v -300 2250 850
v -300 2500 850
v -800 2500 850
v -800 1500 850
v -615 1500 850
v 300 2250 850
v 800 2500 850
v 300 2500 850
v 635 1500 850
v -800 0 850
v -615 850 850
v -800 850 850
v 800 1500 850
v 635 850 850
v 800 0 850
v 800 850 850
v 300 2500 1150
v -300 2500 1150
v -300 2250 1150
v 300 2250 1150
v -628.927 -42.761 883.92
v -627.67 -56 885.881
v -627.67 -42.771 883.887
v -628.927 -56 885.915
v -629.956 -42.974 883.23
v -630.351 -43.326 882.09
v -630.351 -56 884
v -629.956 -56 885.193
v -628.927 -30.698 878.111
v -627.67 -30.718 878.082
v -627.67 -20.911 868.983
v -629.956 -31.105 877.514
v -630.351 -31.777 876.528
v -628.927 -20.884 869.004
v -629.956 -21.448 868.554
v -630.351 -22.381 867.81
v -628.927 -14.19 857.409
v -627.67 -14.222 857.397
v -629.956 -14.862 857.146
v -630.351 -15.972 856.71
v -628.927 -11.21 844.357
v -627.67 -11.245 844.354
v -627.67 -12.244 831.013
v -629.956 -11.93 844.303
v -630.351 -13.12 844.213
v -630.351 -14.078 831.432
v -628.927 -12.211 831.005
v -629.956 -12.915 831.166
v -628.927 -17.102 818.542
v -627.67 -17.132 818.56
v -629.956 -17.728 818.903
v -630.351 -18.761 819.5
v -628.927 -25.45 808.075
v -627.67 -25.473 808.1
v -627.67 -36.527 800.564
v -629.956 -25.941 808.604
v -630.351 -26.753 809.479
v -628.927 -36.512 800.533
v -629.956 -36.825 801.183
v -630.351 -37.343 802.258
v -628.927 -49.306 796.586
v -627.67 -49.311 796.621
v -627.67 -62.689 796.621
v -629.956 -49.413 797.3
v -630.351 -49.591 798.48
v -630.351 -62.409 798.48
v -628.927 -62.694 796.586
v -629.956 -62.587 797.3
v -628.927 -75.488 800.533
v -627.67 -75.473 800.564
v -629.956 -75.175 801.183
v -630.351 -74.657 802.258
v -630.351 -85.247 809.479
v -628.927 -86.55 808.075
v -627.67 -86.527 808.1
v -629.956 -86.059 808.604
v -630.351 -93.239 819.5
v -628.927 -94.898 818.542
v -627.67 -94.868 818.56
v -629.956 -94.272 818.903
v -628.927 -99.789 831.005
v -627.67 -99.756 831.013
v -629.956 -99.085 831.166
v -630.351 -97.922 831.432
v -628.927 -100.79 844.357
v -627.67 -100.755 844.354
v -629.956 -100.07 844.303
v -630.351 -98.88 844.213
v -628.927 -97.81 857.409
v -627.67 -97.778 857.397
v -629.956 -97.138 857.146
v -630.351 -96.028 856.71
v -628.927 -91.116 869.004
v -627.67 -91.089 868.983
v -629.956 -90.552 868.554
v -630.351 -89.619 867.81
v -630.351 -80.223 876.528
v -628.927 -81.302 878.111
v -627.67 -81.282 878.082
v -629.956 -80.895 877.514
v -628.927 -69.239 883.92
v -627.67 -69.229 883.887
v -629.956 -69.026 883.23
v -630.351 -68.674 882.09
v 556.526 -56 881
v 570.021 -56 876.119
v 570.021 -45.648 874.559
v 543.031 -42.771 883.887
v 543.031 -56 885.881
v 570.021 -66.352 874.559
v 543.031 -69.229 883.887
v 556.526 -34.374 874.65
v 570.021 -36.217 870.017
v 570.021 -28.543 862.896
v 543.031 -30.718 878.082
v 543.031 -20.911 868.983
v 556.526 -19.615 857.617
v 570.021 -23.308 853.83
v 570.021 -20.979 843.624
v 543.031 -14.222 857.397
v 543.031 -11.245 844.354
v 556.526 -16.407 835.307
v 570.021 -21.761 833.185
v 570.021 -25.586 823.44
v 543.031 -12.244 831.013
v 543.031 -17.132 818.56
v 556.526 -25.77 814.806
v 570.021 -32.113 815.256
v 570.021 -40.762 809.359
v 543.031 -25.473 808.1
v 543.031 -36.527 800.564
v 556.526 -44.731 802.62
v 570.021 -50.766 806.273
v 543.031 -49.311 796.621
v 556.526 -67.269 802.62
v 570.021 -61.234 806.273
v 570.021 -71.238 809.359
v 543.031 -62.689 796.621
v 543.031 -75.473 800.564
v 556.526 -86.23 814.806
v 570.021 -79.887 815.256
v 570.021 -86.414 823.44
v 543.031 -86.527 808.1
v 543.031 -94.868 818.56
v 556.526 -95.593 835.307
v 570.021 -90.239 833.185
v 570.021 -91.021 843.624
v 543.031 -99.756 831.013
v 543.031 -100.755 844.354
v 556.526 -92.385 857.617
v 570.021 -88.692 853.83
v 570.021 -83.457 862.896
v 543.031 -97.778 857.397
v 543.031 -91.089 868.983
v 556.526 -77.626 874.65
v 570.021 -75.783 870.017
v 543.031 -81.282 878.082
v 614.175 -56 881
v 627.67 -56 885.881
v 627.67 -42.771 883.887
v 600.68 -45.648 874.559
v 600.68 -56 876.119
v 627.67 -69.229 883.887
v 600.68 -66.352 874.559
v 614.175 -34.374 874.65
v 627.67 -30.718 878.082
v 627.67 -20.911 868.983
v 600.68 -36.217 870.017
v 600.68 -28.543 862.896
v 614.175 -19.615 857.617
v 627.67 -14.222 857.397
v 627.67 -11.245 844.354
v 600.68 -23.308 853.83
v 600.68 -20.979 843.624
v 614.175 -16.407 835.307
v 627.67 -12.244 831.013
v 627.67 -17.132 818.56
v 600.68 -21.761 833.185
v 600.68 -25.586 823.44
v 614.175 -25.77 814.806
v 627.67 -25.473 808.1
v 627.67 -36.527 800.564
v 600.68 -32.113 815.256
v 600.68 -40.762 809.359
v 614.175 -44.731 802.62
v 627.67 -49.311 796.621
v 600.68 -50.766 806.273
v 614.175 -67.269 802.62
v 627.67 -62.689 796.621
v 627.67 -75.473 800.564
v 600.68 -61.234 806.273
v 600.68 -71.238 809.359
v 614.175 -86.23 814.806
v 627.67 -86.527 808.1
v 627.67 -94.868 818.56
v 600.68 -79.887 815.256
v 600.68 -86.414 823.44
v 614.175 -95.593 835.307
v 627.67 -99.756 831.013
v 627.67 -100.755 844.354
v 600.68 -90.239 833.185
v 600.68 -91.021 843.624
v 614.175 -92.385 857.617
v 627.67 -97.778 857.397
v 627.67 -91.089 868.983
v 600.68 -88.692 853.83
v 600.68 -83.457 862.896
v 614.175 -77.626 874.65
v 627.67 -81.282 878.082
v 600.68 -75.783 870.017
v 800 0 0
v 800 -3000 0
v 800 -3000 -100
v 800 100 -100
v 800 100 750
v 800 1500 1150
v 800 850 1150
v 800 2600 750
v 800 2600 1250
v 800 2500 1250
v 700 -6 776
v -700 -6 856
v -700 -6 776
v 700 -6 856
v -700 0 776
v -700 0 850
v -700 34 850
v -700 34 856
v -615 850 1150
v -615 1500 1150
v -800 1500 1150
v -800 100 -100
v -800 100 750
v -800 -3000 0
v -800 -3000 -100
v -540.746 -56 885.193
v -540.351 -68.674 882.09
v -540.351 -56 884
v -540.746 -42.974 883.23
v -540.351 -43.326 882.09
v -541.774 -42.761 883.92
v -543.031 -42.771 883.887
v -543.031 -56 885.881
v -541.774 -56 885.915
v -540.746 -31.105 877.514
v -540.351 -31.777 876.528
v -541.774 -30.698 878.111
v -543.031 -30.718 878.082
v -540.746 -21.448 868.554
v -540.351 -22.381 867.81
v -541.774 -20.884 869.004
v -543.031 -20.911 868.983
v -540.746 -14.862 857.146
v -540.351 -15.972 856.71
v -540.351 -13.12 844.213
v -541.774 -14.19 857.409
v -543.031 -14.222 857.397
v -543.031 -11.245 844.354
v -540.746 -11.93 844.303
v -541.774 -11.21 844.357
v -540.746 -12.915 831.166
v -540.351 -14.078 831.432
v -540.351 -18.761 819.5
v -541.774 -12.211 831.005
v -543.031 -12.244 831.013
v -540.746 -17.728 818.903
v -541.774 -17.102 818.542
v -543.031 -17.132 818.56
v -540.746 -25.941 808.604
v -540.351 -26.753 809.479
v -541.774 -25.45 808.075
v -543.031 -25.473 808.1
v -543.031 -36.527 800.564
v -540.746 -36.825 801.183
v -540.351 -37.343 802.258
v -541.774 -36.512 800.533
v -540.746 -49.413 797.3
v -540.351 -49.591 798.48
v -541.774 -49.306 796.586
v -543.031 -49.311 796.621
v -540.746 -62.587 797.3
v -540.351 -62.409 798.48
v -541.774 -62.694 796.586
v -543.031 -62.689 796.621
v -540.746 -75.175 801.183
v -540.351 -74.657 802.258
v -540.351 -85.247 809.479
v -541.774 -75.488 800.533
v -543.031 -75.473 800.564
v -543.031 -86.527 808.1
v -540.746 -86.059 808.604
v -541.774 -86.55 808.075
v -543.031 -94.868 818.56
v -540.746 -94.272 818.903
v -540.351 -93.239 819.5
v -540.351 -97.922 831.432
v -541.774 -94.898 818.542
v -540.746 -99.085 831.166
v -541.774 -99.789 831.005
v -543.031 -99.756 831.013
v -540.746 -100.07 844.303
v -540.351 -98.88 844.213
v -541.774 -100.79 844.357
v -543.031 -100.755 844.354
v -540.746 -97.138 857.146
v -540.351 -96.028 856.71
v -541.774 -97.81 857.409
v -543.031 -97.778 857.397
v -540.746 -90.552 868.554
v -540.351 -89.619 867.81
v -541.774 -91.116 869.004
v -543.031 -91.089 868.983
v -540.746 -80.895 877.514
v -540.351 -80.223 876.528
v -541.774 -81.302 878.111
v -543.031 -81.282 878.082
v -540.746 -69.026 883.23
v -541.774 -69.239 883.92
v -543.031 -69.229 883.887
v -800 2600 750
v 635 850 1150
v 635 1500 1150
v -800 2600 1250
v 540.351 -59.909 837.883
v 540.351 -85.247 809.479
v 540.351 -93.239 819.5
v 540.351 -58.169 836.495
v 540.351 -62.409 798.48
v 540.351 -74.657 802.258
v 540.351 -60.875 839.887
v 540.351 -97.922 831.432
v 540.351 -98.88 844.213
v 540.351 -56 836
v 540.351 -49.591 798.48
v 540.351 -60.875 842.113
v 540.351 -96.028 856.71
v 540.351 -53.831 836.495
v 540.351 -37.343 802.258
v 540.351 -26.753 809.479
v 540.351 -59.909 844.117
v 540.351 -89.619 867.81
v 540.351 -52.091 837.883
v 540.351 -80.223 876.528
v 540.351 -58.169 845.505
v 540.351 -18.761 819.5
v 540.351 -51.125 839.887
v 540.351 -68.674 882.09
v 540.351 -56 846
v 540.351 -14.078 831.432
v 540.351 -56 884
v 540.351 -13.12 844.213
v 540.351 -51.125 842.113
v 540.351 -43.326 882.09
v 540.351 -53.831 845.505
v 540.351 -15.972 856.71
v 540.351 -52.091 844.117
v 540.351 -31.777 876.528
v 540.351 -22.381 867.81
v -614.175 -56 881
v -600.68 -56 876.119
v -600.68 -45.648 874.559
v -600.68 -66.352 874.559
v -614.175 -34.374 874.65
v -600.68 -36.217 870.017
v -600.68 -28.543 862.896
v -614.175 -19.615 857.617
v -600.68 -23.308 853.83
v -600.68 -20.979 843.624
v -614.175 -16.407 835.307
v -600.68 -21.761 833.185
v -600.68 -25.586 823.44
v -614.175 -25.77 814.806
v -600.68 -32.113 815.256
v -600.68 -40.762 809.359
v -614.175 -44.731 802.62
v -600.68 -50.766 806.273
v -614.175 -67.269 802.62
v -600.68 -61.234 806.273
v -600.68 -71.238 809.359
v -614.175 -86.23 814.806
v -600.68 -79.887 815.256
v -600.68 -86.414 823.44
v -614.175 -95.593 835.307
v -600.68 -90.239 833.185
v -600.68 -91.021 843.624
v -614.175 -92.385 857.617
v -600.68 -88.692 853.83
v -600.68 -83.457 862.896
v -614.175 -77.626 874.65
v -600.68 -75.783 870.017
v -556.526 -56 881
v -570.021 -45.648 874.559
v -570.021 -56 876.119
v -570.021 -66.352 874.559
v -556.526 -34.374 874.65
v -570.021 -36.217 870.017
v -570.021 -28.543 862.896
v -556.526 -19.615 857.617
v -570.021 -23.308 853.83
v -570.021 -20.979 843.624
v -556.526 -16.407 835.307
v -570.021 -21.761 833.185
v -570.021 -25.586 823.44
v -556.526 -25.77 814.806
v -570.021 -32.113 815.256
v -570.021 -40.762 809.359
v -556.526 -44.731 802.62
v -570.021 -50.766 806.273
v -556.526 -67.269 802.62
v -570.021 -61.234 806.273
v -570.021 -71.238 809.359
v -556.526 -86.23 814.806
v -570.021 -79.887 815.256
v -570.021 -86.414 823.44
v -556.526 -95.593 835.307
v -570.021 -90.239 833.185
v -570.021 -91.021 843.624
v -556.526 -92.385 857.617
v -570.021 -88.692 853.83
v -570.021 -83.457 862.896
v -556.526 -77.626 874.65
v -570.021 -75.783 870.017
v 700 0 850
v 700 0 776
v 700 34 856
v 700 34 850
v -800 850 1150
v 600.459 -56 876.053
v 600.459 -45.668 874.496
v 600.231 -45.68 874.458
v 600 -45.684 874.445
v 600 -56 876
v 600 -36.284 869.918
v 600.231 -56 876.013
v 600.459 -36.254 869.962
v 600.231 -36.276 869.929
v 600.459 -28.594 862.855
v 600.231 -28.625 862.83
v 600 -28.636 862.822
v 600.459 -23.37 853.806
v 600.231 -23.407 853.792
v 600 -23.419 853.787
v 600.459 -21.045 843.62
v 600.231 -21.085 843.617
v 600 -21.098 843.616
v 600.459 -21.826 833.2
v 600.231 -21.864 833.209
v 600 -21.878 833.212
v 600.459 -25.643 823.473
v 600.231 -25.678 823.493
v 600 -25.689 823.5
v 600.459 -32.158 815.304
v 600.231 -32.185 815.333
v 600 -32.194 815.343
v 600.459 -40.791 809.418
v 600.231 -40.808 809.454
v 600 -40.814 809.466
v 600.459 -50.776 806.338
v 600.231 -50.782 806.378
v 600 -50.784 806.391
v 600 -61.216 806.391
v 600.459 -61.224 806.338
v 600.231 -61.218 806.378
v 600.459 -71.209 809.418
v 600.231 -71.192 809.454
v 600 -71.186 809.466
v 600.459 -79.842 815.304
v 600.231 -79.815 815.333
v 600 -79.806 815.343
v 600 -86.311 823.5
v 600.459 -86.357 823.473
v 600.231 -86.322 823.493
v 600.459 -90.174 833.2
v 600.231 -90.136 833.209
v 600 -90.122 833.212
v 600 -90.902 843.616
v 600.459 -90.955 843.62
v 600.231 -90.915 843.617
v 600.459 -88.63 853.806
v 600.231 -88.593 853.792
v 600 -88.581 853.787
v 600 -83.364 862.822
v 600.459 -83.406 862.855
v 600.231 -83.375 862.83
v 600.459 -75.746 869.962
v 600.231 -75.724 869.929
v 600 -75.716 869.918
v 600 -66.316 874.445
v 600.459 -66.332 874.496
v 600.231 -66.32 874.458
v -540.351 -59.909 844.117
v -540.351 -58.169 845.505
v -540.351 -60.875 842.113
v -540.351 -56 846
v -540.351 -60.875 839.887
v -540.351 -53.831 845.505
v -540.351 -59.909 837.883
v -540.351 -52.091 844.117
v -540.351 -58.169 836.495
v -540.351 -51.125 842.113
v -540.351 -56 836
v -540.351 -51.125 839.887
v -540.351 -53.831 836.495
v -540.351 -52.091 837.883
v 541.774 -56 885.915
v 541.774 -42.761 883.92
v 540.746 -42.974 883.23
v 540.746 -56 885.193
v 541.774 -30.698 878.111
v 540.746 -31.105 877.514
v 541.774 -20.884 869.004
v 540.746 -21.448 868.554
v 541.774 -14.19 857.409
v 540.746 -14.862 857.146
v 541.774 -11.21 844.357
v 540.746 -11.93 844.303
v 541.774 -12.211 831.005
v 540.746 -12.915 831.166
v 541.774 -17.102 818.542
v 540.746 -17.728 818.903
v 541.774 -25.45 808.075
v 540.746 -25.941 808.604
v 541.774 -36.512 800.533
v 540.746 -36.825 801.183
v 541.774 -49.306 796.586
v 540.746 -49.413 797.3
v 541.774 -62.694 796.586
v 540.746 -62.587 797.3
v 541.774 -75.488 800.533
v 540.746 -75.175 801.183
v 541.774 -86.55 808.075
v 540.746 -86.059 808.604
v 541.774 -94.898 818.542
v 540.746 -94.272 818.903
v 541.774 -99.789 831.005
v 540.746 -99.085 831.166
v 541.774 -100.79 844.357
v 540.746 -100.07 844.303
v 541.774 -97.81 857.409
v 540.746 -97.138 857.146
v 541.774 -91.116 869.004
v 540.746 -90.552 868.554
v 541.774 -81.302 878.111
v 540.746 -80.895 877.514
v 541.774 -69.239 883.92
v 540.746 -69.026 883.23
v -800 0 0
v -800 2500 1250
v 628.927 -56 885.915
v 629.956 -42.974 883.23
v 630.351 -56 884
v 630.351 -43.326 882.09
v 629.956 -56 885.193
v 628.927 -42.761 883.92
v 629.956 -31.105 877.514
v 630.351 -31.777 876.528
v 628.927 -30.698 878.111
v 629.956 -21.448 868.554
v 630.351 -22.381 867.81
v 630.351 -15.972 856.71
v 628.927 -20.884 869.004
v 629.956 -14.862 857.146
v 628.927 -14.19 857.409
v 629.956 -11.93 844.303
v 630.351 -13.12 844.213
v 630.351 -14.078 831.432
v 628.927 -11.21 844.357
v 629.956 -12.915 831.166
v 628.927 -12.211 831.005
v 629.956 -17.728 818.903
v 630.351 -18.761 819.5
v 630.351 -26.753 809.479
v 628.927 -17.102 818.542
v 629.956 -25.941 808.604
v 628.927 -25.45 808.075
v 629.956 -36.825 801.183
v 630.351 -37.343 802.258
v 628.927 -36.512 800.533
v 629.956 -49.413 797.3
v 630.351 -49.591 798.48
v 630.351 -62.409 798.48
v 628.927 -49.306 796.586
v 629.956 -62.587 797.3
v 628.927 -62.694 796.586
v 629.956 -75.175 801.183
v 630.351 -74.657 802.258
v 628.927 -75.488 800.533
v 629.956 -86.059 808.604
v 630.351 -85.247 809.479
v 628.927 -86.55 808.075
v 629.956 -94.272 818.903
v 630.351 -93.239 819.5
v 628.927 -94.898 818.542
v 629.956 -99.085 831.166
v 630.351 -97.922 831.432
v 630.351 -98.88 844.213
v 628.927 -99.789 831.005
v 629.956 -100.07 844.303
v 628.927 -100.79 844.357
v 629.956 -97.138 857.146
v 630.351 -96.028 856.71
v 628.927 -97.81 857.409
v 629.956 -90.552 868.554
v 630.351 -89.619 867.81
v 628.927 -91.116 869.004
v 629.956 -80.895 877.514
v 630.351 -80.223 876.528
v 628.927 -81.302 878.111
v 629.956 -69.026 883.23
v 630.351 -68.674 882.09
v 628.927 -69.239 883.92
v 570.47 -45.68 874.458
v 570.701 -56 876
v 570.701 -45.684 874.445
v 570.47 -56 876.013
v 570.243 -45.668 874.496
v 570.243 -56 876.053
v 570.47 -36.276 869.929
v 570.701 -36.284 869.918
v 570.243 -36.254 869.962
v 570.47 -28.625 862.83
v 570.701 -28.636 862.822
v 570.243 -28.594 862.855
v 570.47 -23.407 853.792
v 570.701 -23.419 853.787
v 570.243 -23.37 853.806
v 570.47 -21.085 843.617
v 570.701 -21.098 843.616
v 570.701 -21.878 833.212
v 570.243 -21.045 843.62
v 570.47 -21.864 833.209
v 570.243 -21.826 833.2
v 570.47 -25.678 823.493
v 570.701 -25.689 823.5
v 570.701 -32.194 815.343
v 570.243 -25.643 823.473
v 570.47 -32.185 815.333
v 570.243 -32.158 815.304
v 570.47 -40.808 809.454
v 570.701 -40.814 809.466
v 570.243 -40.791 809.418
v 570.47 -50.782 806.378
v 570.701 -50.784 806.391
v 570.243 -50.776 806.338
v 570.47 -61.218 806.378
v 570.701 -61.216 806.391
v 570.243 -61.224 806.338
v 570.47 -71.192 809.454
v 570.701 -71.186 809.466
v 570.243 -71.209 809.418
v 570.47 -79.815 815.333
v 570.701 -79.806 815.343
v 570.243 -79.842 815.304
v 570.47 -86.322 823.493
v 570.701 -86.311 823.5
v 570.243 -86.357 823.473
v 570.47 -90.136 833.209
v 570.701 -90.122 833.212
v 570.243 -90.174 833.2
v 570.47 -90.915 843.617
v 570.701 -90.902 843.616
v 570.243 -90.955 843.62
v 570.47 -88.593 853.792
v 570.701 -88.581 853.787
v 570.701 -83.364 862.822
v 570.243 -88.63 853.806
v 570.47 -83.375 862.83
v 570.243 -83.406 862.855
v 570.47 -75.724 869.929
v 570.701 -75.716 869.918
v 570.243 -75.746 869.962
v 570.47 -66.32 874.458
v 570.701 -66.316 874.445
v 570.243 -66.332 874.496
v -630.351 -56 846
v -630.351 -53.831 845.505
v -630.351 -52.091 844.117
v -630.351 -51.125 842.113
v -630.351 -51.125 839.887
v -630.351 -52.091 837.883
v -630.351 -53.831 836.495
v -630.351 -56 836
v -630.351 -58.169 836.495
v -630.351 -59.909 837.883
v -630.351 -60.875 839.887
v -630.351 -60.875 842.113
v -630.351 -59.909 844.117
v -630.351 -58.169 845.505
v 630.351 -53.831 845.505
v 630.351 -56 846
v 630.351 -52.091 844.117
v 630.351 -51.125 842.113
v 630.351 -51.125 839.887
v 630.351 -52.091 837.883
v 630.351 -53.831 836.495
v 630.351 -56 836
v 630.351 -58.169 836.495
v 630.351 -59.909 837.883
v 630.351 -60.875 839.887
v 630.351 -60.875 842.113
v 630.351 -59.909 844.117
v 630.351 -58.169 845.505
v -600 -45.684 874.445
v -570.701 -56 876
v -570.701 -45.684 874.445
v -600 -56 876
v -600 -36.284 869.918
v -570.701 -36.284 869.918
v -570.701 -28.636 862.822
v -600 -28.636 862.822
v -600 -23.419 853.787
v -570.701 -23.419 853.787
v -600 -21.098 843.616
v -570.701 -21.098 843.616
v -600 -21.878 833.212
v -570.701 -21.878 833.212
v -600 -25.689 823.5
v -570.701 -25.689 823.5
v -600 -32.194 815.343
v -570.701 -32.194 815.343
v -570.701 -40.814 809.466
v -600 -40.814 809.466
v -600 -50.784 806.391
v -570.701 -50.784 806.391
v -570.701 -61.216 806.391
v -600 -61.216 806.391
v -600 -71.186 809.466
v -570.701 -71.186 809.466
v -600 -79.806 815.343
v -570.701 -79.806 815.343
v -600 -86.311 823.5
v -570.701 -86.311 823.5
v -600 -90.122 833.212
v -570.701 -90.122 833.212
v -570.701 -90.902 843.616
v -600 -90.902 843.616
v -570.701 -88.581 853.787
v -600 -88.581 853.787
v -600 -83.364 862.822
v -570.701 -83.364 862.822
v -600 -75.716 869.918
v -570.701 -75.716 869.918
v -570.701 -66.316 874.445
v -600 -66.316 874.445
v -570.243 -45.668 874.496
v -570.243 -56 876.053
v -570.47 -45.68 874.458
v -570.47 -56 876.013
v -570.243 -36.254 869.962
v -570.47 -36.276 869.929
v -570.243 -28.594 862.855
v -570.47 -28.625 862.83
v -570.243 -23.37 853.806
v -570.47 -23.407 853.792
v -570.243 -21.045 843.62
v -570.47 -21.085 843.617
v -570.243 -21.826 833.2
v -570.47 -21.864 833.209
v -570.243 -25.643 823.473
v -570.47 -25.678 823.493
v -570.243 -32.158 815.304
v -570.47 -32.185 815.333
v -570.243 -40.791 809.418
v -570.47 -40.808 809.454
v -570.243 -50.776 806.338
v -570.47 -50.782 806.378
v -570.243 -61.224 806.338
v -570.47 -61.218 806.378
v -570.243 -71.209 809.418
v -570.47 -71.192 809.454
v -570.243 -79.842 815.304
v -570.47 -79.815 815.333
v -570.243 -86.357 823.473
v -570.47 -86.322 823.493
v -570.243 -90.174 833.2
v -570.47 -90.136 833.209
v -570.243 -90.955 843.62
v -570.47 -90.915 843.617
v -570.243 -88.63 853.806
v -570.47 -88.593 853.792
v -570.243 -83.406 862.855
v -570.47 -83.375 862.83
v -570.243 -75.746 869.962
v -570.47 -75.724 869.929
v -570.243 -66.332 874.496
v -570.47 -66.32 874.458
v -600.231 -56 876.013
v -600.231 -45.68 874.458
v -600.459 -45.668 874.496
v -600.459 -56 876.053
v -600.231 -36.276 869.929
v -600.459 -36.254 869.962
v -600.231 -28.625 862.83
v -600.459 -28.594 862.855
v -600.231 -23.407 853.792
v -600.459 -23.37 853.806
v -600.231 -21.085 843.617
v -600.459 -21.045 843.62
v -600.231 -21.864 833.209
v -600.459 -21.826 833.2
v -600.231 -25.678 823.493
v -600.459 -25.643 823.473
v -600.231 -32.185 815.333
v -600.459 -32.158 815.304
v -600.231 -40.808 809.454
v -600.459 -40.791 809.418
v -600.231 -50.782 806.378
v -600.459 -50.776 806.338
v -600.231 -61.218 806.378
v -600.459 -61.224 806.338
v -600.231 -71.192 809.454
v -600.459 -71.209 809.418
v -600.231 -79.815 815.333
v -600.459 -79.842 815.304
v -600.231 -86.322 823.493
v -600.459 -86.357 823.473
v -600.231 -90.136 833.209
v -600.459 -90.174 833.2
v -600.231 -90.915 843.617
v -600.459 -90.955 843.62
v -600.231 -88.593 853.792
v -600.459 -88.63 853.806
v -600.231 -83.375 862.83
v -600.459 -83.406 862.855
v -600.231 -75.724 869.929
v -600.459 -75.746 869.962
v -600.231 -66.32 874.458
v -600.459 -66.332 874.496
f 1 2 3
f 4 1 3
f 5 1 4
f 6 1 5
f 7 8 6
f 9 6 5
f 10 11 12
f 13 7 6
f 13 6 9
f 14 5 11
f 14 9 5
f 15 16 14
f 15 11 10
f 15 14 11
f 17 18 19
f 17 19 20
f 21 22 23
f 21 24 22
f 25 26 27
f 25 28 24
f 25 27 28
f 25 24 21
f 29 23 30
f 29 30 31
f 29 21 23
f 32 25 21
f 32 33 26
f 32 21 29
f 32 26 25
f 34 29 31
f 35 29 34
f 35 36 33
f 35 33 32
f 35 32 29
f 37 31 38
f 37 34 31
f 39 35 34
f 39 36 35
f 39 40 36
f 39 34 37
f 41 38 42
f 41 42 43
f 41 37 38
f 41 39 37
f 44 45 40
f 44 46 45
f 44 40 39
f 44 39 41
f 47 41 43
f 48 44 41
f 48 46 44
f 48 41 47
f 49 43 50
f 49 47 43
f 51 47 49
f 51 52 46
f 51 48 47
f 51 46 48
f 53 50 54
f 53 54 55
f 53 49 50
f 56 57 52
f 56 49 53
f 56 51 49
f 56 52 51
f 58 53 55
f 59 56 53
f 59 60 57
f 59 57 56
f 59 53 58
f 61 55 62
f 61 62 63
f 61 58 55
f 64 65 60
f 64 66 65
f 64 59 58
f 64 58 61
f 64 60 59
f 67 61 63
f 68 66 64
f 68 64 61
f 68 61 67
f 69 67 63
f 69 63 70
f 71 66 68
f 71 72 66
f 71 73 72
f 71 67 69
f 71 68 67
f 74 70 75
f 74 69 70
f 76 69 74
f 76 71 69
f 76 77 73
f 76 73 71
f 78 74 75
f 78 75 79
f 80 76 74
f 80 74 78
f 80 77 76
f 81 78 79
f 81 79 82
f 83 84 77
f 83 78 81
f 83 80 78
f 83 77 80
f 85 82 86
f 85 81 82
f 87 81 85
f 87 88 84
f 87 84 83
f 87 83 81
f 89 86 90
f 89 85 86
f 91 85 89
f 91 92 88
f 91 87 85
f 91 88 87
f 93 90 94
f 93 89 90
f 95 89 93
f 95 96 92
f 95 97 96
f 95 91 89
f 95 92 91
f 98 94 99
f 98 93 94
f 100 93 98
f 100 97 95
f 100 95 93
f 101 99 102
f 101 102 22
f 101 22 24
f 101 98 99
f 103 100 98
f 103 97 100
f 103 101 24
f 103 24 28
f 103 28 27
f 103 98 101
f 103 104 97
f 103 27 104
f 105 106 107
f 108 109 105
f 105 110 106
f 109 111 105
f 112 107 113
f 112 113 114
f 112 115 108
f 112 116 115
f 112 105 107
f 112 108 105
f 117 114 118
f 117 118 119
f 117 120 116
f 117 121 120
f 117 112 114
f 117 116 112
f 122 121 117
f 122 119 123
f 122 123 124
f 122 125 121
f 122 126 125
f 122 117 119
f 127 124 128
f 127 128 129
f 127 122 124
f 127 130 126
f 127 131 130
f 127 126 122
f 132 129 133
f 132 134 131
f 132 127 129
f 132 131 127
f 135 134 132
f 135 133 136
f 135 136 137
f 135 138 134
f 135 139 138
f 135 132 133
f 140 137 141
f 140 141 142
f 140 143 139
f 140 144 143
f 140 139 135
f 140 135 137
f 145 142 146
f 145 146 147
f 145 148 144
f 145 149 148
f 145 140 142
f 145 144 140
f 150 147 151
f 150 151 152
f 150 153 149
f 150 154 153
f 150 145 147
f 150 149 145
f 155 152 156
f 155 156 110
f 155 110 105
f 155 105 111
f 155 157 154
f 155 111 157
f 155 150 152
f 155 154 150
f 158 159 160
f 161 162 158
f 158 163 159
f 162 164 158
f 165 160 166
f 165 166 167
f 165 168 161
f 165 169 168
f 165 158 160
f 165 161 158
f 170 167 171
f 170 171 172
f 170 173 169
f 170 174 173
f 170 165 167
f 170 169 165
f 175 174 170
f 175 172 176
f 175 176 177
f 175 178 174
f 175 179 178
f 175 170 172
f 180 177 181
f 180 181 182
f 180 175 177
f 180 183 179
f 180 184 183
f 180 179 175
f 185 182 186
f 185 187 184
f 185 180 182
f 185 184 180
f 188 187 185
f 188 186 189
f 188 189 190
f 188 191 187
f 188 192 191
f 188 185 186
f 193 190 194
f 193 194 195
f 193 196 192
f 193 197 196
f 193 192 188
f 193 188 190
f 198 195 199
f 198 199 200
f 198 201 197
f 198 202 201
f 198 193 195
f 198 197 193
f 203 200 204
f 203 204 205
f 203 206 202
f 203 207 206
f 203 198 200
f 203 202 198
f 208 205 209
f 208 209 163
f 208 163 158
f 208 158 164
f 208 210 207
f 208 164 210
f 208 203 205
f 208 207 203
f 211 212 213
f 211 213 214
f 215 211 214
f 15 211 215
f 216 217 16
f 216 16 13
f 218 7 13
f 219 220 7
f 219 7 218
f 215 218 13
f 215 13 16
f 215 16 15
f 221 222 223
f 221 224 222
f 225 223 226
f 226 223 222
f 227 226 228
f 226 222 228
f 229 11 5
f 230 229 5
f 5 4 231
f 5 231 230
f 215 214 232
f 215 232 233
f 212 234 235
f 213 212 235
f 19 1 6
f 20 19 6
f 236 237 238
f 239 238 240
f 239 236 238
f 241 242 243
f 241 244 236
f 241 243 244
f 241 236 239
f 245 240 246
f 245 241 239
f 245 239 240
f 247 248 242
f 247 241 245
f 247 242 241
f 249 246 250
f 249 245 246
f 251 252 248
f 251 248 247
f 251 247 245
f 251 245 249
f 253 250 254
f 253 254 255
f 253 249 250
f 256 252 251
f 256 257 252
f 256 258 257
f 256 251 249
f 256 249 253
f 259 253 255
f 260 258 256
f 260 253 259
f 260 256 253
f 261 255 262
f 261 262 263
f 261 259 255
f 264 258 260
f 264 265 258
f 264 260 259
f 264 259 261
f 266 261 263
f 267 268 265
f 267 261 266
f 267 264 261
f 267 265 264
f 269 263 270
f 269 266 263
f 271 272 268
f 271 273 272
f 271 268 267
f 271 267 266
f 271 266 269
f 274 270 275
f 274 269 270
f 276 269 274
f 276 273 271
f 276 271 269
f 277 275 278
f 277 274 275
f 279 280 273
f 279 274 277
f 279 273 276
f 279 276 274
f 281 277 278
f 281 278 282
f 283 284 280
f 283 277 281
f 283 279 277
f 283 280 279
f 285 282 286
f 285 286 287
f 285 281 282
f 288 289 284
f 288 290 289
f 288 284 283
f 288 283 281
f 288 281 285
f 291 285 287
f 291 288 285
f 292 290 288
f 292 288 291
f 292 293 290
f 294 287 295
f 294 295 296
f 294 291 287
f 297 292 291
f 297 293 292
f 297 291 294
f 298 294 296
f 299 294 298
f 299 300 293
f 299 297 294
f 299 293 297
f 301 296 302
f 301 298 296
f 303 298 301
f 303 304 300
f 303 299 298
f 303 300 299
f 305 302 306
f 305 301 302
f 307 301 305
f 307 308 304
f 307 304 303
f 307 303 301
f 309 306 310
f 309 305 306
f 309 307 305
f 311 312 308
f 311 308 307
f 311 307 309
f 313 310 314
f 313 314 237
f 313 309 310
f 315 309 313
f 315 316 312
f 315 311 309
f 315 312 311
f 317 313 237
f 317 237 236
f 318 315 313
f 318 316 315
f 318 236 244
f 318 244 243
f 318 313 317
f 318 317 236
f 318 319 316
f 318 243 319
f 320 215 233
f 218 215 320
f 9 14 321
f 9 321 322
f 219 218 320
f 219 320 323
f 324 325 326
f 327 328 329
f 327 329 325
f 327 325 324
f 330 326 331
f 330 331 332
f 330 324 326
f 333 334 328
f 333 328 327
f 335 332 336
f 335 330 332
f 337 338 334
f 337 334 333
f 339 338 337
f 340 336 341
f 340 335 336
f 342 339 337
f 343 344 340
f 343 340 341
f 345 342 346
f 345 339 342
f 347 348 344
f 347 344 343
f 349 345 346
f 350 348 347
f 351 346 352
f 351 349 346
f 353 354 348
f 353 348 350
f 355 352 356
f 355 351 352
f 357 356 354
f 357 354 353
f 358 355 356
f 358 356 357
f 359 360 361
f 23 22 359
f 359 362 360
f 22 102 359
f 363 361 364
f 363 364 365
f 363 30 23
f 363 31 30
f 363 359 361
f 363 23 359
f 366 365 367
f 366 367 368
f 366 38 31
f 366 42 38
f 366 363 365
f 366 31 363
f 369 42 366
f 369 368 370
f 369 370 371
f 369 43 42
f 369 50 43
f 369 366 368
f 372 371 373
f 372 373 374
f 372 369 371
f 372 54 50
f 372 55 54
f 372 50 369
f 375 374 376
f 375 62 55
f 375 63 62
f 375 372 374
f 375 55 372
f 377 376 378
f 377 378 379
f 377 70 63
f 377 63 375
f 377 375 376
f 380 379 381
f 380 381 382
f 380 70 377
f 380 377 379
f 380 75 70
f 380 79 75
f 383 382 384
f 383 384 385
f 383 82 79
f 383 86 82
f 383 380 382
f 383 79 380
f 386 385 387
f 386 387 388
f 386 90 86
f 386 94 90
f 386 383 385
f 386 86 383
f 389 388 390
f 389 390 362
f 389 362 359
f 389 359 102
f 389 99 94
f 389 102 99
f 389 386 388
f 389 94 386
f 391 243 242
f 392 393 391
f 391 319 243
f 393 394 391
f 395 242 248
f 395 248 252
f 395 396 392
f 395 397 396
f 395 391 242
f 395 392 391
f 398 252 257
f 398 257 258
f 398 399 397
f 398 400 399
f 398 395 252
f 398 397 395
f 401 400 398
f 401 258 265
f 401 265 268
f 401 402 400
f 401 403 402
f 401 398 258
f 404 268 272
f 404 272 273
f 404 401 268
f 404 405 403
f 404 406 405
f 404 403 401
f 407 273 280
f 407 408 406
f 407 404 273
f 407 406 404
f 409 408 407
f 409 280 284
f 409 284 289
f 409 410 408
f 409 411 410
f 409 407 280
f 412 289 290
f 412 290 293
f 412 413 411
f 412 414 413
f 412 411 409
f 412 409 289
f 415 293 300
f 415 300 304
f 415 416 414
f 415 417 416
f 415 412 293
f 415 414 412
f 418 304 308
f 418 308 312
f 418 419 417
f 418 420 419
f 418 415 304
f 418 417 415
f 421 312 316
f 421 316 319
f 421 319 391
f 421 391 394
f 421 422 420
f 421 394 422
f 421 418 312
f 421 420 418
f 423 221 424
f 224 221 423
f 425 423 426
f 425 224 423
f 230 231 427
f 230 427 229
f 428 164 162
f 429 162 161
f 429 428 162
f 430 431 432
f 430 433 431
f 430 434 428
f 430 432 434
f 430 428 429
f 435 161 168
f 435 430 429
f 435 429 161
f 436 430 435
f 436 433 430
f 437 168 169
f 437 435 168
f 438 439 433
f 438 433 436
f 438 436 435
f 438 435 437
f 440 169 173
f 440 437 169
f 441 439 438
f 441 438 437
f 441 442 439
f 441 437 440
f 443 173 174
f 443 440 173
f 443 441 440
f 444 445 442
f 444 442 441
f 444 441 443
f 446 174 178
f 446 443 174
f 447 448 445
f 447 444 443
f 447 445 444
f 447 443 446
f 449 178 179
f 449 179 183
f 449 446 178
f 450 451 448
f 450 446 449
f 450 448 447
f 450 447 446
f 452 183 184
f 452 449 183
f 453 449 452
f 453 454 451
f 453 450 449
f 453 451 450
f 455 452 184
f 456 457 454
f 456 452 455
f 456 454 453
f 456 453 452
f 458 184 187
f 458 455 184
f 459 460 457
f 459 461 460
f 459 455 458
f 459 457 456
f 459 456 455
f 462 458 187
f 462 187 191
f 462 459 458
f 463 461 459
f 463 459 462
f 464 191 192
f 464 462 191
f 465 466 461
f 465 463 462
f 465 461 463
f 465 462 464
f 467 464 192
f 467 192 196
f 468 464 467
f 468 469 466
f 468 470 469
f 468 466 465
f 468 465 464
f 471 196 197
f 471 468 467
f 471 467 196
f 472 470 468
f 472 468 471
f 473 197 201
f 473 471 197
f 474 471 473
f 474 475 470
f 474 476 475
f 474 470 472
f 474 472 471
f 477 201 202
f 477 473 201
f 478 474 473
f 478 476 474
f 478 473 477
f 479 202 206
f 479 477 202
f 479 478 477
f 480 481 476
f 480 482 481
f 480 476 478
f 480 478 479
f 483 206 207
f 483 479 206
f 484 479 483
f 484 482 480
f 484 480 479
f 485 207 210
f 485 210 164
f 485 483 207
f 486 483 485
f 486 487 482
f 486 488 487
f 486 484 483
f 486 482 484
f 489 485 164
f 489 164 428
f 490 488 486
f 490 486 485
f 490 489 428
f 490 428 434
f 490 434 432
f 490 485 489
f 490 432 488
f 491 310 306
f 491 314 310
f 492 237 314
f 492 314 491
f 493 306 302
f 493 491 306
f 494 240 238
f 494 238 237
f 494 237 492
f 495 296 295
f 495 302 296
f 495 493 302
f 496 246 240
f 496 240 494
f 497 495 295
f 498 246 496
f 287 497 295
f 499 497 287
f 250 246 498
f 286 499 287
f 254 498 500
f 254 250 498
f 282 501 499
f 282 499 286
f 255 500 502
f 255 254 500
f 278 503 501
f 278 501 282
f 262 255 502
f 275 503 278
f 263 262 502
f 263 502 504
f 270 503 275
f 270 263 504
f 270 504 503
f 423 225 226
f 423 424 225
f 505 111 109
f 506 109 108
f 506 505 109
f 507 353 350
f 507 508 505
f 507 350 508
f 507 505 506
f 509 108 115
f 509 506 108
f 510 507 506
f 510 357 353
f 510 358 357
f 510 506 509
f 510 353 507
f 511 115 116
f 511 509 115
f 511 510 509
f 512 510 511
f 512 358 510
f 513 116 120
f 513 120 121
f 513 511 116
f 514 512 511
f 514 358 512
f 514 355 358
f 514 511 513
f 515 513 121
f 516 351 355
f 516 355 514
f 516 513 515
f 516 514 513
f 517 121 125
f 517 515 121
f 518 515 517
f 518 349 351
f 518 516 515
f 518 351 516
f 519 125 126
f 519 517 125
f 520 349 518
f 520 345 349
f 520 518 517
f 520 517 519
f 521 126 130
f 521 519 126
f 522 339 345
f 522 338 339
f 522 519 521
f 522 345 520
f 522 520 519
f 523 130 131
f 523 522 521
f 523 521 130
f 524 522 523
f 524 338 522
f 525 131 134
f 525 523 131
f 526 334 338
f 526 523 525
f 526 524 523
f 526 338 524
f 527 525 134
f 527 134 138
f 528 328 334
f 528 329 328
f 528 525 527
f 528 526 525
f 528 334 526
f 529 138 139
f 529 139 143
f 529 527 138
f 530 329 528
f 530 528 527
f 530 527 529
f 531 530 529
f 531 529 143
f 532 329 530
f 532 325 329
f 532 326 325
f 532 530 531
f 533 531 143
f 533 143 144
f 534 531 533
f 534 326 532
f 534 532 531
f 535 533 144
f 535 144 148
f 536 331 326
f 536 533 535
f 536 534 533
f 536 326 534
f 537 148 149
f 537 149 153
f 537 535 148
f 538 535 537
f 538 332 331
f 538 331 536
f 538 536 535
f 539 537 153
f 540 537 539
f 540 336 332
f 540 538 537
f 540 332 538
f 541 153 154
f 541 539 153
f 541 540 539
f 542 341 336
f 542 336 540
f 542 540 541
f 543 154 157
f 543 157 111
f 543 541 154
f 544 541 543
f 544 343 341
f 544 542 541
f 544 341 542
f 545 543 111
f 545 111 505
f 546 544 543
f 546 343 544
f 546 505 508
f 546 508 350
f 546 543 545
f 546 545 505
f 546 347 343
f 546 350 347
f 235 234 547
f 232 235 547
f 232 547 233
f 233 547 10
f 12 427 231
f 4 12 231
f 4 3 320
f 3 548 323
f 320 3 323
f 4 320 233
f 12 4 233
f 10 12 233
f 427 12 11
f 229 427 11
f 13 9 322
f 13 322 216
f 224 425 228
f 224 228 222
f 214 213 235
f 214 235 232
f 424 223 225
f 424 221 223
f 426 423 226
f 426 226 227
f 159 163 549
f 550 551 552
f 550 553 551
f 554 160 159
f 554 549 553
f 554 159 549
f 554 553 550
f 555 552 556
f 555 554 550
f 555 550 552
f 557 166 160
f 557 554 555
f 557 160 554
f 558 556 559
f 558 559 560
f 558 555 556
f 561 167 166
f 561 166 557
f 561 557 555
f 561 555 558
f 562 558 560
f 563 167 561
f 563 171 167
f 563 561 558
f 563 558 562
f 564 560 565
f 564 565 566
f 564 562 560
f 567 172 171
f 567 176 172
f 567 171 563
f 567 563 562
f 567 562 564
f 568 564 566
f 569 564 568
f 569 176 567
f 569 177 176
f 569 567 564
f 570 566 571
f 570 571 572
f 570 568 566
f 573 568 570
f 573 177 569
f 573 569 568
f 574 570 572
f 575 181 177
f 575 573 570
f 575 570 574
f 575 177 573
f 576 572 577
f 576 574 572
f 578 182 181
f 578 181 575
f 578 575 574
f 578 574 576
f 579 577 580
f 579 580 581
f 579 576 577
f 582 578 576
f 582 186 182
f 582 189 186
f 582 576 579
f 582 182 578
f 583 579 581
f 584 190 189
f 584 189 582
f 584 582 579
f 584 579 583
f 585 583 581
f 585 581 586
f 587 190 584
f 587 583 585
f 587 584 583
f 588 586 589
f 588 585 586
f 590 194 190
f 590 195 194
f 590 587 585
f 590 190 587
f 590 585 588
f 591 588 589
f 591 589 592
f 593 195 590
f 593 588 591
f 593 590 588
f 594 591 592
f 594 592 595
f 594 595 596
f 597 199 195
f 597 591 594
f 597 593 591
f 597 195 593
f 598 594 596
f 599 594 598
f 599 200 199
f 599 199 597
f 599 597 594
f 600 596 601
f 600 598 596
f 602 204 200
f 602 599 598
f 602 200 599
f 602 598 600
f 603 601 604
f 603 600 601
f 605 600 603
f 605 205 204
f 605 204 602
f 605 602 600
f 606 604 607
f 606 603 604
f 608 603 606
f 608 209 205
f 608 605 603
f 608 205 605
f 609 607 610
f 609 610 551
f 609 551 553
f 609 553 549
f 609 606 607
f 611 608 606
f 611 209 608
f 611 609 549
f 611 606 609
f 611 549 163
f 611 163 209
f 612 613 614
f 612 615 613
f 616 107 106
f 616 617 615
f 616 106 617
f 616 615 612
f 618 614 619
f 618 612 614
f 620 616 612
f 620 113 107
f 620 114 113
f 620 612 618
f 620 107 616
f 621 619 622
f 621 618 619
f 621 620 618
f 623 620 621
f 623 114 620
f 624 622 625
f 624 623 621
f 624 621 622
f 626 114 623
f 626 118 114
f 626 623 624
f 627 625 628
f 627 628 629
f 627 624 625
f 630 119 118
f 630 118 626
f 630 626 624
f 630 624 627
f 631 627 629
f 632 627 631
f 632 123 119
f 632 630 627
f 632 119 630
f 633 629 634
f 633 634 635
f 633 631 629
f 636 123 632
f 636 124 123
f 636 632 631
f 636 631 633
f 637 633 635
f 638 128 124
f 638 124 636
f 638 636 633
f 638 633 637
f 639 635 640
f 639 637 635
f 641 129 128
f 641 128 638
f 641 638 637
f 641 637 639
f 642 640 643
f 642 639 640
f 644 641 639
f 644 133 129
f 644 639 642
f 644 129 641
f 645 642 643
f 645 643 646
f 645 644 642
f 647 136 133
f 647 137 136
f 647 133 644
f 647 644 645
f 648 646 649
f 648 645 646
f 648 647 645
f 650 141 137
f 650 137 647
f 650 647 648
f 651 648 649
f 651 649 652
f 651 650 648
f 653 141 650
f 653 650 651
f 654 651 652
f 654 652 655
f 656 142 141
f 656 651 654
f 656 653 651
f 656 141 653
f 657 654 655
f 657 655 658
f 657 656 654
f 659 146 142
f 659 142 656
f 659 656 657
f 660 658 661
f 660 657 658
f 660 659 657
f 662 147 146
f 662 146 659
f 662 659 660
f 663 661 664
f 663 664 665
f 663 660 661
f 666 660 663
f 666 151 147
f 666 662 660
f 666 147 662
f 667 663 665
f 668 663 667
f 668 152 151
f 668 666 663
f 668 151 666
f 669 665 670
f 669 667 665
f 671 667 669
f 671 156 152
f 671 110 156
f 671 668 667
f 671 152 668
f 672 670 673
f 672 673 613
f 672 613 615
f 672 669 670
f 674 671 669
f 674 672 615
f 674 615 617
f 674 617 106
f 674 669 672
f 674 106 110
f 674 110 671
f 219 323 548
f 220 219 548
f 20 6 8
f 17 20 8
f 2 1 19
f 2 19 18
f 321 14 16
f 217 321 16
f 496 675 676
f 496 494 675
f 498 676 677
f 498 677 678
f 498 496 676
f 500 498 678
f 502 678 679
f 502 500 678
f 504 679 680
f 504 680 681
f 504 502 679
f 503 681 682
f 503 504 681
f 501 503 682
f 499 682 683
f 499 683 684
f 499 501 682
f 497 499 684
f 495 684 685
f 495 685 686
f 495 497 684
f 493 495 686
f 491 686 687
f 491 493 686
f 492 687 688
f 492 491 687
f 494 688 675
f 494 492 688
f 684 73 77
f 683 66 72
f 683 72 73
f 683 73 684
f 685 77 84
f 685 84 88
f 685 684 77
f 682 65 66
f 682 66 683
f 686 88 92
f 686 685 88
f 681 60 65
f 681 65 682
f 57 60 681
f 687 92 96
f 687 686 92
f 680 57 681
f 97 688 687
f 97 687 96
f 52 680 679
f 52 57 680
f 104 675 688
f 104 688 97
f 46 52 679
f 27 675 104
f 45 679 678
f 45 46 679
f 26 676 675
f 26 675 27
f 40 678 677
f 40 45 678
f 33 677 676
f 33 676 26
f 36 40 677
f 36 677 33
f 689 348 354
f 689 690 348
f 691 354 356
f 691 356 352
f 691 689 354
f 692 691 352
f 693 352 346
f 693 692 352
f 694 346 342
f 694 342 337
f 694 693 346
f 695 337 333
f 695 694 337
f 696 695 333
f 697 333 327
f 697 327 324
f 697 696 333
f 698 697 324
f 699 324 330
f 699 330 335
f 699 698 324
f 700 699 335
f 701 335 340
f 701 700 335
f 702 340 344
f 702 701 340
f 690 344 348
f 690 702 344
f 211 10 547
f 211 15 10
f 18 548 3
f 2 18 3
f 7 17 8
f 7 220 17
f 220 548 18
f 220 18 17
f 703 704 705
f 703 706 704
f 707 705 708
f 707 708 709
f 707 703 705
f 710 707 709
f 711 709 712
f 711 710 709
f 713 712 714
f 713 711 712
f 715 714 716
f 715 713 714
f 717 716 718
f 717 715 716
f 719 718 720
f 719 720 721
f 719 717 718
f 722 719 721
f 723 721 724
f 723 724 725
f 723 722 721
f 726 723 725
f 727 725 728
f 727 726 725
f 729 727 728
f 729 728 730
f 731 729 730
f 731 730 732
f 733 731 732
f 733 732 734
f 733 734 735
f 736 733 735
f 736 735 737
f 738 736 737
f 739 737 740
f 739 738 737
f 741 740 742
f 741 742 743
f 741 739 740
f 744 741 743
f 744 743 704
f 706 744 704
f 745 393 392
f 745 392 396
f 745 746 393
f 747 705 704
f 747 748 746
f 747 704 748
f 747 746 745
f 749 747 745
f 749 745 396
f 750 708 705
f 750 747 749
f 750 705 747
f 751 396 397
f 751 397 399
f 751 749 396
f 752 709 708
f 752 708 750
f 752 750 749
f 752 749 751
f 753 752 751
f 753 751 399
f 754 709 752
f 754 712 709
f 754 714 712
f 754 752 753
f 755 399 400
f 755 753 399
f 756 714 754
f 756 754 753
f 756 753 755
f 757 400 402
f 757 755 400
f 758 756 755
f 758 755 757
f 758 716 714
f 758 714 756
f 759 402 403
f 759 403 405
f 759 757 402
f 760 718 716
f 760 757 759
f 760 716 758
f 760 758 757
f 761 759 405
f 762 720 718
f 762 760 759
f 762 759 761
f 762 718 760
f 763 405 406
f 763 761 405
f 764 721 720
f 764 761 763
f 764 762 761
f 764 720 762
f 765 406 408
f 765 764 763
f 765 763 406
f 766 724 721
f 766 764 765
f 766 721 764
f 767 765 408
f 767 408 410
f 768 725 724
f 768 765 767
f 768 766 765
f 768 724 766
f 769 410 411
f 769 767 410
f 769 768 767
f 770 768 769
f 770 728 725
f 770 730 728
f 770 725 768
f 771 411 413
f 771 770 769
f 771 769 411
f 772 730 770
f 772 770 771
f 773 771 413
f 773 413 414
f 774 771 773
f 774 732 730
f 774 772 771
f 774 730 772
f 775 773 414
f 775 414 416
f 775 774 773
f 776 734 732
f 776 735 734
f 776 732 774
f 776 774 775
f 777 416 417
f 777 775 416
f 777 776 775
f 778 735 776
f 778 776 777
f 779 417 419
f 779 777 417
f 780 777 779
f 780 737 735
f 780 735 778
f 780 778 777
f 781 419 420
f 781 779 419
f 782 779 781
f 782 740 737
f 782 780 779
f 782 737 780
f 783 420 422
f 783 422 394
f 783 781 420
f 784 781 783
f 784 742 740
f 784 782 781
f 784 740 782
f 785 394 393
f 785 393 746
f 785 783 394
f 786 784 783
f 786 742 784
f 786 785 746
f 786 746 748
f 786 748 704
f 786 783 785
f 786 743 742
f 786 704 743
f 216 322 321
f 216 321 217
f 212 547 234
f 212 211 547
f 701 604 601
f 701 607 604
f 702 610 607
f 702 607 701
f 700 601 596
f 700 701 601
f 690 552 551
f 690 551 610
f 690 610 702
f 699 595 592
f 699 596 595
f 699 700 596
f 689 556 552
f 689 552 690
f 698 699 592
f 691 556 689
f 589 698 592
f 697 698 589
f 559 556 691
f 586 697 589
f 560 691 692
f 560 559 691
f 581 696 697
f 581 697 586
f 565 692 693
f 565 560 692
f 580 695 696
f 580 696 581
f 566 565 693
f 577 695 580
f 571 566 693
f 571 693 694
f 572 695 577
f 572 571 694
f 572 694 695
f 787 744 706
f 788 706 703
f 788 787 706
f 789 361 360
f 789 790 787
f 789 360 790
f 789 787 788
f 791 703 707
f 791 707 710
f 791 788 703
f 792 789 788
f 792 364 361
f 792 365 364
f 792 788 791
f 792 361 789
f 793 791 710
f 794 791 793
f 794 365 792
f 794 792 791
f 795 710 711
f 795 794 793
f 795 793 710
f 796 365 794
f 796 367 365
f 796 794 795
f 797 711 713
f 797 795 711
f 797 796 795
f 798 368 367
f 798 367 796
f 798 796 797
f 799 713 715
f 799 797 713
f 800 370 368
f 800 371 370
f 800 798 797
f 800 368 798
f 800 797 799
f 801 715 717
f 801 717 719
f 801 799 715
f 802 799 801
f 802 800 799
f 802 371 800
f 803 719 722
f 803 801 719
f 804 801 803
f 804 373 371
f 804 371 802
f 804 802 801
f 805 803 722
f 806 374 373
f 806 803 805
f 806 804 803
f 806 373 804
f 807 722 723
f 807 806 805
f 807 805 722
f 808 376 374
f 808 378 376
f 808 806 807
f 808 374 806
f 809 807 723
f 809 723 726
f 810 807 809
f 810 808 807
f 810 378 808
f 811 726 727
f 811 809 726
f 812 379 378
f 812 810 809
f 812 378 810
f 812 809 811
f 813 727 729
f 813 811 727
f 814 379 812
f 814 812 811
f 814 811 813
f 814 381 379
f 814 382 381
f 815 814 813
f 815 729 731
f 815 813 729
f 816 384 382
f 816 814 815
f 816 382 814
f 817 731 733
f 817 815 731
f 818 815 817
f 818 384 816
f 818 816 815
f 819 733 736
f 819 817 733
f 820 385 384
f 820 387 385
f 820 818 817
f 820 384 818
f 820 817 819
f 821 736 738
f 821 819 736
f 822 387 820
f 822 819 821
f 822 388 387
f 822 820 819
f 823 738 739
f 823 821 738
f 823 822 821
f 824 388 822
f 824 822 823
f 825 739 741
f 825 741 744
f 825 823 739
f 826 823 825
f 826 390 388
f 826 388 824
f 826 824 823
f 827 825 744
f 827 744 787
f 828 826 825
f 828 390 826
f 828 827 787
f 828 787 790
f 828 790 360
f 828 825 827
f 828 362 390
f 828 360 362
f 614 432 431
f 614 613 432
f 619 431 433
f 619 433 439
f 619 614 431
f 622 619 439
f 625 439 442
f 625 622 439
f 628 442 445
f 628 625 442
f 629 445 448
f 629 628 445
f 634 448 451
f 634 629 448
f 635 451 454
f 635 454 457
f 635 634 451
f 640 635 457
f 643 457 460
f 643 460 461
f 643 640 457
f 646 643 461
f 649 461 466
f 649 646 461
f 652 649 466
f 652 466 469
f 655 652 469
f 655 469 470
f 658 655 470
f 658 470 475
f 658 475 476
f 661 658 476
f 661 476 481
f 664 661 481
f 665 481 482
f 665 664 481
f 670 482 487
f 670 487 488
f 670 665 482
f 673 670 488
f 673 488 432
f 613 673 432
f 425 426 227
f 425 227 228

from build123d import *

# Parameters (mm, degrees)
F1_DEPTH = 800
F2_W     = 185
F2_H     = 650
F2_W_2   = 165
F2_W_3   = 600
F2_H_2   = 250
F3_DEPTH = 300
F5_DEPTH = 700


with BuildPart() as f1:
    # F0 (on Right) → F1 (new body, symmetric)
    with BuildSketch(Plane.YZ):
        Polygon((0, 0), (-3000, 0), (-3000, -100), (100, -100), (100, 750), (2600, 750), (2600, 1250), (2500, 1250), (2500, 850), (0, 850), align=None)
    extrude(amount=F1_DEPTH, both=True)

    # F2 (on face) → F3 (join)
    with BuildSketch(Plane.XY.offset(850)):
        with Locations((-707.5, 1175)):
            Rectangle(F2_W, F2_H)
        with Locations((717.5, 1175)):
            Rectangle(F2_W_2, F2_H)
        with Locations((0, 2375)):
            Rectangle(F2_W_3, F2_H_2)
    extrude(amount=F3_DEPTH)


with BuildPart() as f5:
    # F4 (on Right) → F5 (new body, symmetric)
    with BuildSketch(Plane.YZ):
        Polygon((0, 776), (0, 850), (34, 850), (34, 856), (-6, 856), (-6, 776), align=None)
    extrude(amount=F5_DEPTH, both=True)


with BuildPart() as f8:
    # F7 (on offset) → F8 (revolve)
    with BuildSketch(Plane.XZ.offset(56)):
        with BuildLine():
            Line((-600.6802203414, 876.1192288052), (-627.6703390229, 885.8807711948))
            ThreePointArc((-627.6703390229, 885.8807711948), (-629.4993759983, 885.6371378504), (-630.3505593642, 884))
            Line((-630.3505593642, 884), (-630.3505593642, 846))
            Line((-630.3505593642, 846), (-540.3505593642, 846))
            Line((-540.3505593642, 846), (-540.3505593642, 884))
            ThreePointArc((-540.3505593642, 884), (-541.2017427302, 885.6371378504), (-543.0307797056, 885.8807711948))
            Line((-543.0307797056, 885.8807711948), (-570.0208983871, 876.1192288052))
            ThreePointArc((-570.0208983871, 876.1192288052), (-570.3558234849, 876.0300326919), (-570.7011187284, 876))
            Line((-570.7011187284, 876), (-600, 876))
            ThreePointArc((-600, 876), (-600.3452952435, 876.0300326919), (-600.6802203414, 876.1192288052))
        make_face()
    revolve(axis=Axis((572.4560523535, -56, 841), (-1, 0, 0)))


with BuildPart() as f8b:
    # F7 (on offset) → F8, piece 2 (revolve)
    with BuildSketch(Plane.XZ.offset(56)):
        with BuildLine():
            Line((627.6703390229, 885.8807711948), (600.6802203414, 876.1192288052))
            ThreePointArc((600.6802203414, 876.1192288052), (600.3452952435, 876.0300326919), (600, 876))
            Line((600, 876), (570.7011187284, 876))
            ThreePointArc((570.7011187284, 876), (570.3558234849, 876.0300326919), (570.0208983871, 876.1192288052))
            Line((570.0208983871, 876.1192288052), (543.0307797056, 885.8807711948))
            ThreePointArc((543.0307797056, 885.8807711948), (541.2017427302, 885.6371378504), (540.3505593642, 884))
            Line((540.3505593642, 884), (540.3505593642, 846))
            Line((540.3505593642, 846), (630.3505593642, 846))
            Line((630.3505593642, 846), (630.3505593642, 884))
            ThreePointArc((630.3505593642, 884), (629.4993759983, 885.6371378504), (627.6703390229, 885.8807711948))
        make_face()
    revolve(axis=Axis((572.4560523535, -56, 841), (-1, 0, 0)))


solid = Compound([f1.part, f5.part, f8.part, f8b.part])
